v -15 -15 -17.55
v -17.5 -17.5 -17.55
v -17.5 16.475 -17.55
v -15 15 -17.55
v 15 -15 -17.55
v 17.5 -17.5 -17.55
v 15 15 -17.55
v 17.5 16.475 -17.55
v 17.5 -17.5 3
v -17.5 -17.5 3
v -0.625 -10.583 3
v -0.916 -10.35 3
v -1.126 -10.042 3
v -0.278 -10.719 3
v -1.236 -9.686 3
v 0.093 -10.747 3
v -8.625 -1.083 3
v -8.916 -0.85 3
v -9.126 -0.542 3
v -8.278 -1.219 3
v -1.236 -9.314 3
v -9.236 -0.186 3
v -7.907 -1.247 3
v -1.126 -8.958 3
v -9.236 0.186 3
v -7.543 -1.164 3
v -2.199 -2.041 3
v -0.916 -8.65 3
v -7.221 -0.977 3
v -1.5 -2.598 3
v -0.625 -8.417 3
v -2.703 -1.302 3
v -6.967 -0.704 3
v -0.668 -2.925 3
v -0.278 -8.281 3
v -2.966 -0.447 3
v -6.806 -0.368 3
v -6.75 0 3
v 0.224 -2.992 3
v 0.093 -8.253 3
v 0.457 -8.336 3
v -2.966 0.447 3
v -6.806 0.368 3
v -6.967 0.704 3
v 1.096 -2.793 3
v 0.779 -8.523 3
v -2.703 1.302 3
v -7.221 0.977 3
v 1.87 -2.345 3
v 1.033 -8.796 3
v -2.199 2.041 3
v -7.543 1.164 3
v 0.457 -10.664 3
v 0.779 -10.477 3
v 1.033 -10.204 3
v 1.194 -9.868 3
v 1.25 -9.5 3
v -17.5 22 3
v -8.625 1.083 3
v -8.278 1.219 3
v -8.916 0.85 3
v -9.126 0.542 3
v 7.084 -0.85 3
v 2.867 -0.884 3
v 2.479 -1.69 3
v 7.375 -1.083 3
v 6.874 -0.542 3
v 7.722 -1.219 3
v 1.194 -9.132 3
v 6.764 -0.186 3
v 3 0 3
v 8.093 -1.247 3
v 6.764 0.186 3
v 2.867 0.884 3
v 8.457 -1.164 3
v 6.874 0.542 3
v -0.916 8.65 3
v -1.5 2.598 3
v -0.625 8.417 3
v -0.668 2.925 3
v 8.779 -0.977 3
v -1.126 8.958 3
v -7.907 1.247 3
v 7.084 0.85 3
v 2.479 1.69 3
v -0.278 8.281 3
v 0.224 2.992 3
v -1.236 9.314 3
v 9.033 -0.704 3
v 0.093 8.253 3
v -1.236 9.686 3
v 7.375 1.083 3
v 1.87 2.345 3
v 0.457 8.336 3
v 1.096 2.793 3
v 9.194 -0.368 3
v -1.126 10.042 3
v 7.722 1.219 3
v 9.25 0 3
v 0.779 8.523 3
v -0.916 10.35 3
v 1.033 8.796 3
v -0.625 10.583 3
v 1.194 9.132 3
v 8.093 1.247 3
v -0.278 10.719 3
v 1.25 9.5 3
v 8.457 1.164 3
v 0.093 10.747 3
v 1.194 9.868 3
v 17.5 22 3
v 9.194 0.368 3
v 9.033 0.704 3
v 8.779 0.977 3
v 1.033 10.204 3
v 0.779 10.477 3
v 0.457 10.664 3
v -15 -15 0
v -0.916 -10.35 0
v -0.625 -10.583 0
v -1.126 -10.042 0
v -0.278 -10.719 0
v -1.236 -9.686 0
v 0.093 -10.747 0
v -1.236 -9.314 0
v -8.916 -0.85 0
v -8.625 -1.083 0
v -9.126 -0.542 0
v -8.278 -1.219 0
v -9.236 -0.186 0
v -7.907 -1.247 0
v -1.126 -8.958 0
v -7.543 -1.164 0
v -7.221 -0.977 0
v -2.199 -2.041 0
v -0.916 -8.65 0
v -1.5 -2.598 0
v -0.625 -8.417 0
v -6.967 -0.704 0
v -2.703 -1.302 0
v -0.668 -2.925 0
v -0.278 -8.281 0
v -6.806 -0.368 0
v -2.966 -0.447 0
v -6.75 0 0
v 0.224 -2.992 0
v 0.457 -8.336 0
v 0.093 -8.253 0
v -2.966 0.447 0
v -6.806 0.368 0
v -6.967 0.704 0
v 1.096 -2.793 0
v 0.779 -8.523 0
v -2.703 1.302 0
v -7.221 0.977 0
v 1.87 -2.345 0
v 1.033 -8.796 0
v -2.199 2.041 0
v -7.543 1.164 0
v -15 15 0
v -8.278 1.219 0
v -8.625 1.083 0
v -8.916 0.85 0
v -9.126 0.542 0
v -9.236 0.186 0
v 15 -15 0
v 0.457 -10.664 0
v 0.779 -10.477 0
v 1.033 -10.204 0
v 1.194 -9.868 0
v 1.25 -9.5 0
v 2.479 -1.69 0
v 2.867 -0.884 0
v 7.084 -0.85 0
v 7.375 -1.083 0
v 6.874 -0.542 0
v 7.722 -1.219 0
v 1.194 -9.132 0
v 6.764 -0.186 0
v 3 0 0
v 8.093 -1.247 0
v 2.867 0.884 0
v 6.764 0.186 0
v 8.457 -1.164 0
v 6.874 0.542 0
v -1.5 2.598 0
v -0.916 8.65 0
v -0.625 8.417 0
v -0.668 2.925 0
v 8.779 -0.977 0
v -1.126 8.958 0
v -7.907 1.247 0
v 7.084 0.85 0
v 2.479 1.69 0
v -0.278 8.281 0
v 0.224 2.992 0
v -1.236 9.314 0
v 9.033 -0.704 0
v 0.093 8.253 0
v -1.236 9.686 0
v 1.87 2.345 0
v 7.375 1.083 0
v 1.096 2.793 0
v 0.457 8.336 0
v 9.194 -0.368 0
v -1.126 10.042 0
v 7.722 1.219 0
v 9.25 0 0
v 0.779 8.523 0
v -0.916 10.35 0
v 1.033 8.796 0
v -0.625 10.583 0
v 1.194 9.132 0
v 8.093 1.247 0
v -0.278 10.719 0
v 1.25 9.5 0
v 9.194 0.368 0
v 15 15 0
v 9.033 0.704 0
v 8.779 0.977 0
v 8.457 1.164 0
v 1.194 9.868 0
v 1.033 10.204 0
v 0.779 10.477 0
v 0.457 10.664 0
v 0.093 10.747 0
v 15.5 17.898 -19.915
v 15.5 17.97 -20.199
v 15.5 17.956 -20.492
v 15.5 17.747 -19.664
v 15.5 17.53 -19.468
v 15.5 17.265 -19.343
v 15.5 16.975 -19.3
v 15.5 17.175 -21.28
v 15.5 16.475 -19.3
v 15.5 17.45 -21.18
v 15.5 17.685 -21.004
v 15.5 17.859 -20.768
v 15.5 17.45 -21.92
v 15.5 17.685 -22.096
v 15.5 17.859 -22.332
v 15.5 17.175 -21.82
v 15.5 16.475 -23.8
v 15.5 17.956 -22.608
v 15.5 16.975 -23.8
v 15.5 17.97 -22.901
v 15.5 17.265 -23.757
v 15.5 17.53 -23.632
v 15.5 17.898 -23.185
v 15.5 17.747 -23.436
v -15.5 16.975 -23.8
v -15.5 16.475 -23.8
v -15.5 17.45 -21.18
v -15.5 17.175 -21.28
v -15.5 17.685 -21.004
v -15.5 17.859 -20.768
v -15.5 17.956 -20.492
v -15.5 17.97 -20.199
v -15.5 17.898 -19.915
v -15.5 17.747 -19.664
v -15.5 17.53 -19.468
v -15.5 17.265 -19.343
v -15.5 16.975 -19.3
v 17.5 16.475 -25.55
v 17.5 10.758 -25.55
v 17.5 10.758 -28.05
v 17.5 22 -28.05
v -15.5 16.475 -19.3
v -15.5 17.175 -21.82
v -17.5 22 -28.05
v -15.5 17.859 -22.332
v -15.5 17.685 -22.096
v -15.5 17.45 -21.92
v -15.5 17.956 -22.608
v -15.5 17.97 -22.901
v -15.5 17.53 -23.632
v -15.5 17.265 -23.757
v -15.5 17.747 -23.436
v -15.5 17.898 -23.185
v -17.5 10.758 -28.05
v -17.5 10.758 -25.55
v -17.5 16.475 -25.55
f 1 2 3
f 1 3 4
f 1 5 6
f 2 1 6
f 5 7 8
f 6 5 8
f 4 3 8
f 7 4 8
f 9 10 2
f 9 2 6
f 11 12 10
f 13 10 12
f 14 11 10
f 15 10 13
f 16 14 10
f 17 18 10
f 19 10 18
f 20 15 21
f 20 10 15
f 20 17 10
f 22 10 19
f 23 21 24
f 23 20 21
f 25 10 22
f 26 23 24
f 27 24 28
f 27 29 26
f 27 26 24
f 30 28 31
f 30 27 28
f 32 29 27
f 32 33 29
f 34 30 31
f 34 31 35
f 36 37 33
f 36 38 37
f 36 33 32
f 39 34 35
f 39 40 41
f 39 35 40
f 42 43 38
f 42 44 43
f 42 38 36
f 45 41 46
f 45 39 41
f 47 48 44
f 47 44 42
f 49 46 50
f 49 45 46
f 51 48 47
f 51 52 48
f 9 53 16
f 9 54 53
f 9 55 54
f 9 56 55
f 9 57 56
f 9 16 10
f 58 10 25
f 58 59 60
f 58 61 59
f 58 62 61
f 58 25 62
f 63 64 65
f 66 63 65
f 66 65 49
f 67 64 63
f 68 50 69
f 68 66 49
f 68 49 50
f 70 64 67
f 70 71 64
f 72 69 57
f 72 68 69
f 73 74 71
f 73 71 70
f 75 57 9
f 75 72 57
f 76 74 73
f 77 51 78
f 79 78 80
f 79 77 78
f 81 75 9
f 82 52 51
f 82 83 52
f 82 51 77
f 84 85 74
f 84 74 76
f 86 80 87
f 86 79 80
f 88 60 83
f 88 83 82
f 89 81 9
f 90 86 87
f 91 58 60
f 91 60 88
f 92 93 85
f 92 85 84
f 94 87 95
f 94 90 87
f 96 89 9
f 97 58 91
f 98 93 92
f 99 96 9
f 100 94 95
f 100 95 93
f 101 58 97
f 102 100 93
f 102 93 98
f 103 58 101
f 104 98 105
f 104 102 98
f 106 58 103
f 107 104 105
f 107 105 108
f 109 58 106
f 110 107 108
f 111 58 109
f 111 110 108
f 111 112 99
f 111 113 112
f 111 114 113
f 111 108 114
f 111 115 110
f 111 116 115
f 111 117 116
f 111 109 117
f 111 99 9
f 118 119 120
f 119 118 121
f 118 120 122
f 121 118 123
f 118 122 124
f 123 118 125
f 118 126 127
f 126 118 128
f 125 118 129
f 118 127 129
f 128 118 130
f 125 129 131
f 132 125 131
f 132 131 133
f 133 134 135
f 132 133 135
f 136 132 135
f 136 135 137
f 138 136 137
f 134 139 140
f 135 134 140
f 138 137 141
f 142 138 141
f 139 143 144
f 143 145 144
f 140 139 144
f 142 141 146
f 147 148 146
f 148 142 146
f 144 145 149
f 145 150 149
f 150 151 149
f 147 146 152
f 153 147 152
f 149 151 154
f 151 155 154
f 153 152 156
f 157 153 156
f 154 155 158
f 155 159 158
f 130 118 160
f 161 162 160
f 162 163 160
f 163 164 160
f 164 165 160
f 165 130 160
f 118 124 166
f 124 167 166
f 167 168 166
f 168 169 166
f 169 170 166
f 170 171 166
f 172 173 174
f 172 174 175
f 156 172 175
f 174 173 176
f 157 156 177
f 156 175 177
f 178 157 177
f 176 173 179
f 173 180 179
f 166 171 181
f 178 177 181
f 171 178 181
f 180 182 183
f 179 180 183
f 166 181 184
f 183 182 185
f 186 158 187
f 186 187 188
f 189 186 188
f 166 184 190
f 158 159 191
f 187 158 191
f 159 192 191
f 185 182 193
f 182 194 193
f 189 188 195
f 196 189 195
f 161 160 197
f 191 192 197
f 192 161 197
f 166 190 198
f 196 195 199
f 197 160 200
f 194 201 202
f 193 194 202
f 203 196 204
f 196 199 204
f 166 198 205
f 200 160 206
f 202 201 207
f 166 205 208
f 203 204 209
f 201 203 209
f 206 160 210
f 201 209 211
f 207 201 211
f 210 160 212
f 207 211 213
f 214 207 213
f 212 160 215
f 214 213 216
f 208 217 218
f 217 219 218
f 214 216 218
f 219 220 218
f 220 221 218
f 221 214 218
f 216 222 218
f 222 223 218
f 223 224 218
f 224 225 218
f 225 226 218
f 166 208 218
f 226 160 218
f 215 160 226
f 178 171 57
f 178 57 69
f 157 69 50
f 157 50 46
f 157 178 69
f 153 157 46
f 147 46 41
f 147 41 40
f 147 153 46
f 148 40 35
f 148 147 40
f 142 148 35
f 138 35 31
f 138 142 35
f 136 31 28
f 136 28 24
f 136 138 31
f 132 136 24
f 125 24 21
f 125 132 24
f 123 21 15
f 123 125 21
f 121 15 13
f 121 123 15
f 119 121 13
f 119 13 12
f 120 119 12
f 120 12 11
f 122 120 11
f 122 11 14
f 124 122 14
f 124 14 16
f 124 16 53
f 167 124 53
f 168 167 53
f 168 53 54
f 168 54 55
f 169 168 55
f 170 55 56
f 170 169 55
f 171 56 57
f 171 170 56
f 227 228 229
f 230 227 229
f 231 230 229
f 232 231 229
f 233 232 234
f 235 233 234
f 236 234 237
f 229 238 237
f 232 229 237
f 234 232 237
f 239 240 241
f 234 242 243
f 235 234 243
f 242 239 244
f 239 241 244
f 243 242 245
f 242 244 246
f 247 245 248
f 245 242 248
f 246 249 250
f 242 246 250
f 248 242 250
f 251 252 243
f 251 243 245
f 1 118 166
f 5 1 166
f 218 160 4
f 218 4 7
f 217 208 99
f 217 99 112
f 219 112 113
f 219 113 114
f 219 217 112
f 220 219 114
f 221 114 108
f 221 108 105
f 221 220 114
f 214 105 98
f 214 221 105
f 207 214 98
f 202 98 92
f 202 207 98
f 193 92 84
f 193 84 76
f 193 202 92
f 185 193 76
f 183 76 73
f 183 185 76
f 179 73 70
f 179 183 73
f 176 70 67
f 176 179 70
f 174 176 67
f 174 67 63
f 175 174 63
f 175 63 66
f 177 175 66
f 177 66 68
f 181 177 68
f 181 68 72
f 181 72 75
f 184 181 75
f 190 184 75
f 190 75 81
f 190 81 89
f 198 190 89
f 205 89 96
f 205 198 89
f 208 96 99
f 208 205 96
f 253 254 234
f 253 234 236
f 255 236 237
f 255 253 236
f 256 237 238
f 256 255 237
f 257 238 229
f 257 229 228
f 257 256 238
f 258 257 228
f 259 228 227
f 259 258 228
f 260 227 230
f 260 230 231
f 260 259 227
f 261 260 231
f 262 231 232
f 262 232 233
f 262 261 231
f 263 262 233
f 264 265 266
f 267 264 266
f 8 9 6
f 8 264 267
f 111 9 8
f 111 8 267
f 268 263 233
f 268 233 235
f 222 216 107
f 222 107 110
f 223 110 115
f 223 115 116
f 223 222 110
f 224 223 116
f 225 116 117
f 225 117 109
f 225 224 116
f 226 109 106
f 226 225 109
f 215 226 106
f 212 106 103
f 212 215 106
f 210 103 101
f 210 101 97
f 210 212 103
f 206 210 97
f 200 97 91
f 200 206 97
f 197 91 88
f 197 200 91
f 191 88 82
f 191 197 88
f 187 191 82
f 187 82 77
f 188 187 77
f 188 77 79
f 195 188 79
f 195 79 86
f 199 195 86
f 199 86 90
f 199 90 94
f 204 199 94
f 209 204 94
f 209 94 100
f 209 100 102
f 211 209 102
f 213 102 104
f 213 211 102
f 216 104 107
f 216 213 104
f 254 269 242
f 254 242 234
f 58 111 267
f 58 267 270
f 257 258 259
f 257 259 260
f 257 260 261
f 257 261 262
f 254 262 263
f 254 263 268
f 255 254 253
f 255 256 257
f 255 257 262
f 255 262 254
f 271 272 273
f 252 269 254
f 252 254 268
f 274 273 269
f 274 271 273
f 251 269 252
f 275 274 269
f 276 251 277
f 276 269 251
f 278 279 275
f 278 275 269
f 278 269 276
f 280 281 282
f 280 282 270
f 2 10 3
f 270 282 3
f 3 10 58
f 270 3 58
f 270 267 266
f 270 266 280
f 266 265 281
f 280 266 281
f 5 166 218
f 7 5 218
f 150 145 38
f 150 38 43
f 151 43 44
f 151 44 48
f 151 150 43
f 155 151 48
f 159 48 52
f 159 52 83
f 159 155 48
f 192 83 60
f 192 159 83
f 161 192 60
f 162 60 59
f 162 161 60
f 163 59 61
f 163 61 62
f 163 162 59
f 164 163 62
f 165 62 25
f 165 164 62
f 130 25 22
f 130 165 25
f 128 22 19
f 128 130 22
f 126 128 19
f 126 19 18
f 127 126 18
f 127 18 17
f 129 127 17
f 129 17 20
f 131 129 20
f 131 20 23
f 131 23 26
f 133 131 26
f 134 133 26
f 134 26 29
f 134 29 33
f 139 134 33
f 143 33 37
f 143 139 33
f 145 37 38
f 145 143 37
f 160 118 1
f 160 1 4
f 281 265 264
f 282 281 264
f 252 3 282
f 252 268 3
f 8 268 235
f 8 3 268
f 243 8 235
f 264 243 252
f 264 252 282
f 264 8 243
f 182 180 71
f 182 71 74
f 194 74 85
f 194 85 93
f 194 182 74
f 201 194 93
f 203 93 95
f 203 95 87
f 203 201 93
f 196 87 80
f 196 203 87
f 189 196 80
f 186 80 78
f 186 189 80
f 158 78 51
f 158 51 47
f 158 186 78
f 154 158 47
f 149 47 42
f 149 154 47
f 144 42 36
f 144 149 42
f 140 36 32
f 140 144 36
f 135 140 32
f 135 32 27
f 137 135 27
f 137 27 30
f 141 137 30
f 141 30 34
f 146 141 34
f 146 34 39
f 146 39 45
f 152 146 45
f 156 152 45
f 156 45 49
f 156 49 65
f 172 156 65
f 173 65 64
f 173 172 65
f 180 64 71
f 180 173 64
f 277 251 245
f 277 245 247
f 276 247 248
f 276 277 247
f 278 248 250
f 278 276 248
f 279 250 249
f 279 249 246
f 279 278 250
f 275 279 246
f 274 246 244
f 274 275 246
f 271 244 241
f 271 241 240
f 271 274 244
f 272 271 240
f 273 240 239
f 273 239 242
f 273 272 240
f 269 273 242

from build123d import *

# Parameters (mm, degrees)
SKETCH1_R           = 1.25
SKETCH1_R_2         = 3
BOSS_EXTRUDE1_DEPTH = 3
SKETCH2_W           = 35
SKETCH2_H           = 39.5
SKETCH2_W_2         = 30
SKETCH2_H_2         = 30
BOSS_EXTRUDE2_DEPTH = 20.55
BOSS_EXTRUDE3_START = -3
SKETCH2_2_W         = 30
SKETCH2_2_H         = 30
BOSS_EXTRUDE3_DEPTH = 3
SKETCH3_W           = 35
SKETCH3_H           = 11.242333622
BOSS_EXTRUDE4_DEPTH = 10.5
CUT_EXTRUDE1_REACH  = 51.958
SKETCH4_W           = 8
SKETCH4_H           = 5.717333622
CUT_EXTRUDE2_START  = -33
CUT_EXTRUDE2_DEPTH  = 31


with BuildPart() as part:
    # Sketch1 → Boss-Extrude1 (new body)
    with BuildSketch(Plane.XY):
        with BuildLine():
            Line((-10.880679664, -4.940982702), (-10.677312396, -4.737615434))
            ThreePointArc((-10.677312396, -4.737615434), (-4.737615434, -4.737615434), (-4.737615434, -10.677312396))
            Line((-4.737615434, -10.677312396), (-4.940982702, -10.880679664))
            ThreePointArc((-4.940982702, -10.880679664), (0, -11.95), (4.940982702, -10.880679664))
            Line((4.940982702, -10.880679664), (4.737615434, -10.677312396))
            ThreePointArc((4.737615434, -10.677312396), (4.737615434, -4.737615434), (10.677312396, -4.737615434))
            Line((10.677312396, -4.737615434), (10.880679664, -4.940982702))
            ThreePointArc((10.880679664, -4.940982702), (11.95, 0), (10.880679664, 4.940982702))
            Line((10.880679664, 4.940982702), (10.677312396, 4.737615434))
            ThreePointArc((10.677312396, 4.737615434), (4.737615434, 4.737615434), (4.737615434, 10.677312396))
            Line((4.737615434, 10.677312396), (4.940982702, 10.880679664))
            ThreePointArc((4.940982702, 10.880679664), (0, 11.95), (-4.940982702, 10.880679664))
            Line((-4.940982702, 10.880679664), (-4.737615434, 10.677312396))
            ThreePointArc((-4.737615434, 10.677312396), (-4.737615434, 4.737615434), (-10.677312396, 4.737615434))
            Line((-10.677312396, 4.737615434), (-10.880679664, 4.940982702))
            ThreePointArc((-10.880679664, 4.940982702), (-11.95, 0), (-10.880679664, -4.940982702))
        make_face()
        with Locations((8, 0)):
            Circle(SKETCH1_R, mode=Mode.SUBTRACT)
        with Locations((0, 9.5)):
            Circle(SKETCH1_R, mode=Mode.SUBTRACT)
        with Locations((0, -9.5)):
            Circle(SKETCH1_R, mode=Mode.SUBTRACT)
        with Locations((-8, 0)):
            Circle(SKETCH1_R, mode=Mode.SUBTRACT)
        Circle(SKETCH1_R_2, mode=Mode.SUBTRACT)
    extrude(amount=BOSS_EXTRUDE1_DEPTH)



with BuildPart() as body_2:
    # Sketch2 → Boss-Extrude2 (new body)
    with BuildSketch(Plane.XY.offset(3)):
        with Locations((0, 2.25)):
            Rectangle(SKETCH2_W, SKETCH2_H)
        Rectangle(SKETCH2_W_2, SKETCH2_H_2, mode=Mode.SUBTRACT)
    extrude(amount=-BOSS_EXTRUDE2_DEPTH)


with BuildPart() as part_1:
    add(part.part)

    add(body_2.part)  # Boss-Extrude3 merges body 2
    # Sketch2<2> → Boss-Extrude3 (add)
    with BuildSketch(Plane.XY.offset(3).offset(BOSS_EXTRUDE3_START)):
        Rectangle(SKETCH2_2_W, SKETCH2_2_H)
        with BuildLine():
            ThreePointArc((-10.880679664, 4.940982702), (-11.95, 0), (-10.880679664, -4.940982702))
            Line((-10.880679664, -4.940982702), (-10.677312396, -4.737615434))
            ThreePointArc((-10.677312396, -4.737615434), (-4.737615434, -4.737615434), (-4.737615434, -10.677312396))
            Line((-4.737615434, -10.677312396), (-4.940982702, -10.880679664))
            ThreePointArc((-4.940982702, -10.880679664), (0, -11.95), (4.940982702, -10.880679664))
            Line((4.940982702, -10.880679664), (4.737615434, -10.677312396))
            ThreePointArc((4.737615434, -10.677312396), (4.737615434, -4.737615434), (10.677312396, -4.737615434))
            Line((10.677312396, -4.737615434), (10.880679664, -4.940982702))
            ThreePointArc((10.880679664, -4.940982702), (11.95, 0), (10.880679664, 4.940982702))
            Line((10.880679664, 4.940982702), (10.677312396, 4.737615434))
            ThreePointArc((10.677312396, 4.737615434), (4.737615434, 4.737615434), (4.737615434, 10.677312396))
            Line((4.737615434, 10.677312396), (4.940982702, 10.880679664))
            ThreePointArc((4.940982702, 10.880679664), (0, 11.95), (-4.940982702, 10.880679664))
            Line((-4.940982702, 10.880679664), (-4.737615434, 10.677312396))
            ThreePointArc((-4.737615434, 10.677312396), (-4.737615434, 4.737615434), (-10.677312396, 4.737615434))
            Line((-10.677312396, 4.737615434), (-10.880679664, 4.940982702))
        make_face(mode=Mode.SUBTRACT)
    extrude(amount=BOSS_EXTRUDE3_DEPTH)

    # Sketch3 → Boss-Extrude4 (add)
    with BuildSketch(Plane(origin=(0, 0, -17.55), x_dir=(-1, 0, 0), z_dir=(0, 0, -1))):
        with Locations((0, 16.378833189)):
            Rectangle(SKETCH3_W, SKETCH3_H)
    extrude(amount=BOSS_EXTRUDE4_DEPTH)

    # Sketch4 → Cut-Extrude1 (cut, up to next)
    with BuildSketch(Plane(origin=(17.5, 0, 0), x_dir=(0, 0, -1), z_dir=(1, 0, 0)), mode=Mode.PRIVATE) as cut_extrude1_sk1:
        with Locations((21.55, 13.616333189)):
            Rectangle(SKETCH4_W, SKETCH4_H)
    cut_extrude1_tool1 = extrude(cut_extrude1_sk1.sketch, amount=-CUT_EXTRUDE1_REACH, mode=Mode.PRIVATE) & part_1.part
    add(cut_extrude1_tool1.solids().sort_by_distance((17.5, 13.616333, -21.55))[0], mode=Mode.SUBTRACT)

    # Sketch4<3> → Cut-Extrude2 (cut)
    with BuildSketch(Plane(origin=(17.5, 0, 0), x_dir=(0, 0, -1), z_dir=(1, 0, 0)).offset(CUT_EXTRUDE2_START)):
        with BuildLine():
            Line((21.55, 17.175), (21.55, 16.475))
            Line((21.55, 16.475), (23.8, 16.475))
            Line((23.8, 16.475), (23.8, 16.975))
            ThreePointArc((23.8, 16.975), (22.900508962, 17.969936153), (21.820204103, 17.175))
            Line((21.820204103, 17.175), (21.55, 17.175))
        make_face()
        with BuildLine():
            Line((19.3, 16.975), (19.3, 16.475))
            Line((19.3, 16.475), (21.55, 16.475))
            Line((21.55, 16.475), (21.55, 17.175))
            Line((21.55, 17.175), (21.279795897, 17.175))
            ThreePointArc((21.279795897, 17.175), (20.199491038, 17.969936153), (19.3, 16.975))
        make_face()
    extrude(amount=CUT_EXTRUDE2_DEPTH, mode=Mode.SUBTRACT)


solid = part_1.part
